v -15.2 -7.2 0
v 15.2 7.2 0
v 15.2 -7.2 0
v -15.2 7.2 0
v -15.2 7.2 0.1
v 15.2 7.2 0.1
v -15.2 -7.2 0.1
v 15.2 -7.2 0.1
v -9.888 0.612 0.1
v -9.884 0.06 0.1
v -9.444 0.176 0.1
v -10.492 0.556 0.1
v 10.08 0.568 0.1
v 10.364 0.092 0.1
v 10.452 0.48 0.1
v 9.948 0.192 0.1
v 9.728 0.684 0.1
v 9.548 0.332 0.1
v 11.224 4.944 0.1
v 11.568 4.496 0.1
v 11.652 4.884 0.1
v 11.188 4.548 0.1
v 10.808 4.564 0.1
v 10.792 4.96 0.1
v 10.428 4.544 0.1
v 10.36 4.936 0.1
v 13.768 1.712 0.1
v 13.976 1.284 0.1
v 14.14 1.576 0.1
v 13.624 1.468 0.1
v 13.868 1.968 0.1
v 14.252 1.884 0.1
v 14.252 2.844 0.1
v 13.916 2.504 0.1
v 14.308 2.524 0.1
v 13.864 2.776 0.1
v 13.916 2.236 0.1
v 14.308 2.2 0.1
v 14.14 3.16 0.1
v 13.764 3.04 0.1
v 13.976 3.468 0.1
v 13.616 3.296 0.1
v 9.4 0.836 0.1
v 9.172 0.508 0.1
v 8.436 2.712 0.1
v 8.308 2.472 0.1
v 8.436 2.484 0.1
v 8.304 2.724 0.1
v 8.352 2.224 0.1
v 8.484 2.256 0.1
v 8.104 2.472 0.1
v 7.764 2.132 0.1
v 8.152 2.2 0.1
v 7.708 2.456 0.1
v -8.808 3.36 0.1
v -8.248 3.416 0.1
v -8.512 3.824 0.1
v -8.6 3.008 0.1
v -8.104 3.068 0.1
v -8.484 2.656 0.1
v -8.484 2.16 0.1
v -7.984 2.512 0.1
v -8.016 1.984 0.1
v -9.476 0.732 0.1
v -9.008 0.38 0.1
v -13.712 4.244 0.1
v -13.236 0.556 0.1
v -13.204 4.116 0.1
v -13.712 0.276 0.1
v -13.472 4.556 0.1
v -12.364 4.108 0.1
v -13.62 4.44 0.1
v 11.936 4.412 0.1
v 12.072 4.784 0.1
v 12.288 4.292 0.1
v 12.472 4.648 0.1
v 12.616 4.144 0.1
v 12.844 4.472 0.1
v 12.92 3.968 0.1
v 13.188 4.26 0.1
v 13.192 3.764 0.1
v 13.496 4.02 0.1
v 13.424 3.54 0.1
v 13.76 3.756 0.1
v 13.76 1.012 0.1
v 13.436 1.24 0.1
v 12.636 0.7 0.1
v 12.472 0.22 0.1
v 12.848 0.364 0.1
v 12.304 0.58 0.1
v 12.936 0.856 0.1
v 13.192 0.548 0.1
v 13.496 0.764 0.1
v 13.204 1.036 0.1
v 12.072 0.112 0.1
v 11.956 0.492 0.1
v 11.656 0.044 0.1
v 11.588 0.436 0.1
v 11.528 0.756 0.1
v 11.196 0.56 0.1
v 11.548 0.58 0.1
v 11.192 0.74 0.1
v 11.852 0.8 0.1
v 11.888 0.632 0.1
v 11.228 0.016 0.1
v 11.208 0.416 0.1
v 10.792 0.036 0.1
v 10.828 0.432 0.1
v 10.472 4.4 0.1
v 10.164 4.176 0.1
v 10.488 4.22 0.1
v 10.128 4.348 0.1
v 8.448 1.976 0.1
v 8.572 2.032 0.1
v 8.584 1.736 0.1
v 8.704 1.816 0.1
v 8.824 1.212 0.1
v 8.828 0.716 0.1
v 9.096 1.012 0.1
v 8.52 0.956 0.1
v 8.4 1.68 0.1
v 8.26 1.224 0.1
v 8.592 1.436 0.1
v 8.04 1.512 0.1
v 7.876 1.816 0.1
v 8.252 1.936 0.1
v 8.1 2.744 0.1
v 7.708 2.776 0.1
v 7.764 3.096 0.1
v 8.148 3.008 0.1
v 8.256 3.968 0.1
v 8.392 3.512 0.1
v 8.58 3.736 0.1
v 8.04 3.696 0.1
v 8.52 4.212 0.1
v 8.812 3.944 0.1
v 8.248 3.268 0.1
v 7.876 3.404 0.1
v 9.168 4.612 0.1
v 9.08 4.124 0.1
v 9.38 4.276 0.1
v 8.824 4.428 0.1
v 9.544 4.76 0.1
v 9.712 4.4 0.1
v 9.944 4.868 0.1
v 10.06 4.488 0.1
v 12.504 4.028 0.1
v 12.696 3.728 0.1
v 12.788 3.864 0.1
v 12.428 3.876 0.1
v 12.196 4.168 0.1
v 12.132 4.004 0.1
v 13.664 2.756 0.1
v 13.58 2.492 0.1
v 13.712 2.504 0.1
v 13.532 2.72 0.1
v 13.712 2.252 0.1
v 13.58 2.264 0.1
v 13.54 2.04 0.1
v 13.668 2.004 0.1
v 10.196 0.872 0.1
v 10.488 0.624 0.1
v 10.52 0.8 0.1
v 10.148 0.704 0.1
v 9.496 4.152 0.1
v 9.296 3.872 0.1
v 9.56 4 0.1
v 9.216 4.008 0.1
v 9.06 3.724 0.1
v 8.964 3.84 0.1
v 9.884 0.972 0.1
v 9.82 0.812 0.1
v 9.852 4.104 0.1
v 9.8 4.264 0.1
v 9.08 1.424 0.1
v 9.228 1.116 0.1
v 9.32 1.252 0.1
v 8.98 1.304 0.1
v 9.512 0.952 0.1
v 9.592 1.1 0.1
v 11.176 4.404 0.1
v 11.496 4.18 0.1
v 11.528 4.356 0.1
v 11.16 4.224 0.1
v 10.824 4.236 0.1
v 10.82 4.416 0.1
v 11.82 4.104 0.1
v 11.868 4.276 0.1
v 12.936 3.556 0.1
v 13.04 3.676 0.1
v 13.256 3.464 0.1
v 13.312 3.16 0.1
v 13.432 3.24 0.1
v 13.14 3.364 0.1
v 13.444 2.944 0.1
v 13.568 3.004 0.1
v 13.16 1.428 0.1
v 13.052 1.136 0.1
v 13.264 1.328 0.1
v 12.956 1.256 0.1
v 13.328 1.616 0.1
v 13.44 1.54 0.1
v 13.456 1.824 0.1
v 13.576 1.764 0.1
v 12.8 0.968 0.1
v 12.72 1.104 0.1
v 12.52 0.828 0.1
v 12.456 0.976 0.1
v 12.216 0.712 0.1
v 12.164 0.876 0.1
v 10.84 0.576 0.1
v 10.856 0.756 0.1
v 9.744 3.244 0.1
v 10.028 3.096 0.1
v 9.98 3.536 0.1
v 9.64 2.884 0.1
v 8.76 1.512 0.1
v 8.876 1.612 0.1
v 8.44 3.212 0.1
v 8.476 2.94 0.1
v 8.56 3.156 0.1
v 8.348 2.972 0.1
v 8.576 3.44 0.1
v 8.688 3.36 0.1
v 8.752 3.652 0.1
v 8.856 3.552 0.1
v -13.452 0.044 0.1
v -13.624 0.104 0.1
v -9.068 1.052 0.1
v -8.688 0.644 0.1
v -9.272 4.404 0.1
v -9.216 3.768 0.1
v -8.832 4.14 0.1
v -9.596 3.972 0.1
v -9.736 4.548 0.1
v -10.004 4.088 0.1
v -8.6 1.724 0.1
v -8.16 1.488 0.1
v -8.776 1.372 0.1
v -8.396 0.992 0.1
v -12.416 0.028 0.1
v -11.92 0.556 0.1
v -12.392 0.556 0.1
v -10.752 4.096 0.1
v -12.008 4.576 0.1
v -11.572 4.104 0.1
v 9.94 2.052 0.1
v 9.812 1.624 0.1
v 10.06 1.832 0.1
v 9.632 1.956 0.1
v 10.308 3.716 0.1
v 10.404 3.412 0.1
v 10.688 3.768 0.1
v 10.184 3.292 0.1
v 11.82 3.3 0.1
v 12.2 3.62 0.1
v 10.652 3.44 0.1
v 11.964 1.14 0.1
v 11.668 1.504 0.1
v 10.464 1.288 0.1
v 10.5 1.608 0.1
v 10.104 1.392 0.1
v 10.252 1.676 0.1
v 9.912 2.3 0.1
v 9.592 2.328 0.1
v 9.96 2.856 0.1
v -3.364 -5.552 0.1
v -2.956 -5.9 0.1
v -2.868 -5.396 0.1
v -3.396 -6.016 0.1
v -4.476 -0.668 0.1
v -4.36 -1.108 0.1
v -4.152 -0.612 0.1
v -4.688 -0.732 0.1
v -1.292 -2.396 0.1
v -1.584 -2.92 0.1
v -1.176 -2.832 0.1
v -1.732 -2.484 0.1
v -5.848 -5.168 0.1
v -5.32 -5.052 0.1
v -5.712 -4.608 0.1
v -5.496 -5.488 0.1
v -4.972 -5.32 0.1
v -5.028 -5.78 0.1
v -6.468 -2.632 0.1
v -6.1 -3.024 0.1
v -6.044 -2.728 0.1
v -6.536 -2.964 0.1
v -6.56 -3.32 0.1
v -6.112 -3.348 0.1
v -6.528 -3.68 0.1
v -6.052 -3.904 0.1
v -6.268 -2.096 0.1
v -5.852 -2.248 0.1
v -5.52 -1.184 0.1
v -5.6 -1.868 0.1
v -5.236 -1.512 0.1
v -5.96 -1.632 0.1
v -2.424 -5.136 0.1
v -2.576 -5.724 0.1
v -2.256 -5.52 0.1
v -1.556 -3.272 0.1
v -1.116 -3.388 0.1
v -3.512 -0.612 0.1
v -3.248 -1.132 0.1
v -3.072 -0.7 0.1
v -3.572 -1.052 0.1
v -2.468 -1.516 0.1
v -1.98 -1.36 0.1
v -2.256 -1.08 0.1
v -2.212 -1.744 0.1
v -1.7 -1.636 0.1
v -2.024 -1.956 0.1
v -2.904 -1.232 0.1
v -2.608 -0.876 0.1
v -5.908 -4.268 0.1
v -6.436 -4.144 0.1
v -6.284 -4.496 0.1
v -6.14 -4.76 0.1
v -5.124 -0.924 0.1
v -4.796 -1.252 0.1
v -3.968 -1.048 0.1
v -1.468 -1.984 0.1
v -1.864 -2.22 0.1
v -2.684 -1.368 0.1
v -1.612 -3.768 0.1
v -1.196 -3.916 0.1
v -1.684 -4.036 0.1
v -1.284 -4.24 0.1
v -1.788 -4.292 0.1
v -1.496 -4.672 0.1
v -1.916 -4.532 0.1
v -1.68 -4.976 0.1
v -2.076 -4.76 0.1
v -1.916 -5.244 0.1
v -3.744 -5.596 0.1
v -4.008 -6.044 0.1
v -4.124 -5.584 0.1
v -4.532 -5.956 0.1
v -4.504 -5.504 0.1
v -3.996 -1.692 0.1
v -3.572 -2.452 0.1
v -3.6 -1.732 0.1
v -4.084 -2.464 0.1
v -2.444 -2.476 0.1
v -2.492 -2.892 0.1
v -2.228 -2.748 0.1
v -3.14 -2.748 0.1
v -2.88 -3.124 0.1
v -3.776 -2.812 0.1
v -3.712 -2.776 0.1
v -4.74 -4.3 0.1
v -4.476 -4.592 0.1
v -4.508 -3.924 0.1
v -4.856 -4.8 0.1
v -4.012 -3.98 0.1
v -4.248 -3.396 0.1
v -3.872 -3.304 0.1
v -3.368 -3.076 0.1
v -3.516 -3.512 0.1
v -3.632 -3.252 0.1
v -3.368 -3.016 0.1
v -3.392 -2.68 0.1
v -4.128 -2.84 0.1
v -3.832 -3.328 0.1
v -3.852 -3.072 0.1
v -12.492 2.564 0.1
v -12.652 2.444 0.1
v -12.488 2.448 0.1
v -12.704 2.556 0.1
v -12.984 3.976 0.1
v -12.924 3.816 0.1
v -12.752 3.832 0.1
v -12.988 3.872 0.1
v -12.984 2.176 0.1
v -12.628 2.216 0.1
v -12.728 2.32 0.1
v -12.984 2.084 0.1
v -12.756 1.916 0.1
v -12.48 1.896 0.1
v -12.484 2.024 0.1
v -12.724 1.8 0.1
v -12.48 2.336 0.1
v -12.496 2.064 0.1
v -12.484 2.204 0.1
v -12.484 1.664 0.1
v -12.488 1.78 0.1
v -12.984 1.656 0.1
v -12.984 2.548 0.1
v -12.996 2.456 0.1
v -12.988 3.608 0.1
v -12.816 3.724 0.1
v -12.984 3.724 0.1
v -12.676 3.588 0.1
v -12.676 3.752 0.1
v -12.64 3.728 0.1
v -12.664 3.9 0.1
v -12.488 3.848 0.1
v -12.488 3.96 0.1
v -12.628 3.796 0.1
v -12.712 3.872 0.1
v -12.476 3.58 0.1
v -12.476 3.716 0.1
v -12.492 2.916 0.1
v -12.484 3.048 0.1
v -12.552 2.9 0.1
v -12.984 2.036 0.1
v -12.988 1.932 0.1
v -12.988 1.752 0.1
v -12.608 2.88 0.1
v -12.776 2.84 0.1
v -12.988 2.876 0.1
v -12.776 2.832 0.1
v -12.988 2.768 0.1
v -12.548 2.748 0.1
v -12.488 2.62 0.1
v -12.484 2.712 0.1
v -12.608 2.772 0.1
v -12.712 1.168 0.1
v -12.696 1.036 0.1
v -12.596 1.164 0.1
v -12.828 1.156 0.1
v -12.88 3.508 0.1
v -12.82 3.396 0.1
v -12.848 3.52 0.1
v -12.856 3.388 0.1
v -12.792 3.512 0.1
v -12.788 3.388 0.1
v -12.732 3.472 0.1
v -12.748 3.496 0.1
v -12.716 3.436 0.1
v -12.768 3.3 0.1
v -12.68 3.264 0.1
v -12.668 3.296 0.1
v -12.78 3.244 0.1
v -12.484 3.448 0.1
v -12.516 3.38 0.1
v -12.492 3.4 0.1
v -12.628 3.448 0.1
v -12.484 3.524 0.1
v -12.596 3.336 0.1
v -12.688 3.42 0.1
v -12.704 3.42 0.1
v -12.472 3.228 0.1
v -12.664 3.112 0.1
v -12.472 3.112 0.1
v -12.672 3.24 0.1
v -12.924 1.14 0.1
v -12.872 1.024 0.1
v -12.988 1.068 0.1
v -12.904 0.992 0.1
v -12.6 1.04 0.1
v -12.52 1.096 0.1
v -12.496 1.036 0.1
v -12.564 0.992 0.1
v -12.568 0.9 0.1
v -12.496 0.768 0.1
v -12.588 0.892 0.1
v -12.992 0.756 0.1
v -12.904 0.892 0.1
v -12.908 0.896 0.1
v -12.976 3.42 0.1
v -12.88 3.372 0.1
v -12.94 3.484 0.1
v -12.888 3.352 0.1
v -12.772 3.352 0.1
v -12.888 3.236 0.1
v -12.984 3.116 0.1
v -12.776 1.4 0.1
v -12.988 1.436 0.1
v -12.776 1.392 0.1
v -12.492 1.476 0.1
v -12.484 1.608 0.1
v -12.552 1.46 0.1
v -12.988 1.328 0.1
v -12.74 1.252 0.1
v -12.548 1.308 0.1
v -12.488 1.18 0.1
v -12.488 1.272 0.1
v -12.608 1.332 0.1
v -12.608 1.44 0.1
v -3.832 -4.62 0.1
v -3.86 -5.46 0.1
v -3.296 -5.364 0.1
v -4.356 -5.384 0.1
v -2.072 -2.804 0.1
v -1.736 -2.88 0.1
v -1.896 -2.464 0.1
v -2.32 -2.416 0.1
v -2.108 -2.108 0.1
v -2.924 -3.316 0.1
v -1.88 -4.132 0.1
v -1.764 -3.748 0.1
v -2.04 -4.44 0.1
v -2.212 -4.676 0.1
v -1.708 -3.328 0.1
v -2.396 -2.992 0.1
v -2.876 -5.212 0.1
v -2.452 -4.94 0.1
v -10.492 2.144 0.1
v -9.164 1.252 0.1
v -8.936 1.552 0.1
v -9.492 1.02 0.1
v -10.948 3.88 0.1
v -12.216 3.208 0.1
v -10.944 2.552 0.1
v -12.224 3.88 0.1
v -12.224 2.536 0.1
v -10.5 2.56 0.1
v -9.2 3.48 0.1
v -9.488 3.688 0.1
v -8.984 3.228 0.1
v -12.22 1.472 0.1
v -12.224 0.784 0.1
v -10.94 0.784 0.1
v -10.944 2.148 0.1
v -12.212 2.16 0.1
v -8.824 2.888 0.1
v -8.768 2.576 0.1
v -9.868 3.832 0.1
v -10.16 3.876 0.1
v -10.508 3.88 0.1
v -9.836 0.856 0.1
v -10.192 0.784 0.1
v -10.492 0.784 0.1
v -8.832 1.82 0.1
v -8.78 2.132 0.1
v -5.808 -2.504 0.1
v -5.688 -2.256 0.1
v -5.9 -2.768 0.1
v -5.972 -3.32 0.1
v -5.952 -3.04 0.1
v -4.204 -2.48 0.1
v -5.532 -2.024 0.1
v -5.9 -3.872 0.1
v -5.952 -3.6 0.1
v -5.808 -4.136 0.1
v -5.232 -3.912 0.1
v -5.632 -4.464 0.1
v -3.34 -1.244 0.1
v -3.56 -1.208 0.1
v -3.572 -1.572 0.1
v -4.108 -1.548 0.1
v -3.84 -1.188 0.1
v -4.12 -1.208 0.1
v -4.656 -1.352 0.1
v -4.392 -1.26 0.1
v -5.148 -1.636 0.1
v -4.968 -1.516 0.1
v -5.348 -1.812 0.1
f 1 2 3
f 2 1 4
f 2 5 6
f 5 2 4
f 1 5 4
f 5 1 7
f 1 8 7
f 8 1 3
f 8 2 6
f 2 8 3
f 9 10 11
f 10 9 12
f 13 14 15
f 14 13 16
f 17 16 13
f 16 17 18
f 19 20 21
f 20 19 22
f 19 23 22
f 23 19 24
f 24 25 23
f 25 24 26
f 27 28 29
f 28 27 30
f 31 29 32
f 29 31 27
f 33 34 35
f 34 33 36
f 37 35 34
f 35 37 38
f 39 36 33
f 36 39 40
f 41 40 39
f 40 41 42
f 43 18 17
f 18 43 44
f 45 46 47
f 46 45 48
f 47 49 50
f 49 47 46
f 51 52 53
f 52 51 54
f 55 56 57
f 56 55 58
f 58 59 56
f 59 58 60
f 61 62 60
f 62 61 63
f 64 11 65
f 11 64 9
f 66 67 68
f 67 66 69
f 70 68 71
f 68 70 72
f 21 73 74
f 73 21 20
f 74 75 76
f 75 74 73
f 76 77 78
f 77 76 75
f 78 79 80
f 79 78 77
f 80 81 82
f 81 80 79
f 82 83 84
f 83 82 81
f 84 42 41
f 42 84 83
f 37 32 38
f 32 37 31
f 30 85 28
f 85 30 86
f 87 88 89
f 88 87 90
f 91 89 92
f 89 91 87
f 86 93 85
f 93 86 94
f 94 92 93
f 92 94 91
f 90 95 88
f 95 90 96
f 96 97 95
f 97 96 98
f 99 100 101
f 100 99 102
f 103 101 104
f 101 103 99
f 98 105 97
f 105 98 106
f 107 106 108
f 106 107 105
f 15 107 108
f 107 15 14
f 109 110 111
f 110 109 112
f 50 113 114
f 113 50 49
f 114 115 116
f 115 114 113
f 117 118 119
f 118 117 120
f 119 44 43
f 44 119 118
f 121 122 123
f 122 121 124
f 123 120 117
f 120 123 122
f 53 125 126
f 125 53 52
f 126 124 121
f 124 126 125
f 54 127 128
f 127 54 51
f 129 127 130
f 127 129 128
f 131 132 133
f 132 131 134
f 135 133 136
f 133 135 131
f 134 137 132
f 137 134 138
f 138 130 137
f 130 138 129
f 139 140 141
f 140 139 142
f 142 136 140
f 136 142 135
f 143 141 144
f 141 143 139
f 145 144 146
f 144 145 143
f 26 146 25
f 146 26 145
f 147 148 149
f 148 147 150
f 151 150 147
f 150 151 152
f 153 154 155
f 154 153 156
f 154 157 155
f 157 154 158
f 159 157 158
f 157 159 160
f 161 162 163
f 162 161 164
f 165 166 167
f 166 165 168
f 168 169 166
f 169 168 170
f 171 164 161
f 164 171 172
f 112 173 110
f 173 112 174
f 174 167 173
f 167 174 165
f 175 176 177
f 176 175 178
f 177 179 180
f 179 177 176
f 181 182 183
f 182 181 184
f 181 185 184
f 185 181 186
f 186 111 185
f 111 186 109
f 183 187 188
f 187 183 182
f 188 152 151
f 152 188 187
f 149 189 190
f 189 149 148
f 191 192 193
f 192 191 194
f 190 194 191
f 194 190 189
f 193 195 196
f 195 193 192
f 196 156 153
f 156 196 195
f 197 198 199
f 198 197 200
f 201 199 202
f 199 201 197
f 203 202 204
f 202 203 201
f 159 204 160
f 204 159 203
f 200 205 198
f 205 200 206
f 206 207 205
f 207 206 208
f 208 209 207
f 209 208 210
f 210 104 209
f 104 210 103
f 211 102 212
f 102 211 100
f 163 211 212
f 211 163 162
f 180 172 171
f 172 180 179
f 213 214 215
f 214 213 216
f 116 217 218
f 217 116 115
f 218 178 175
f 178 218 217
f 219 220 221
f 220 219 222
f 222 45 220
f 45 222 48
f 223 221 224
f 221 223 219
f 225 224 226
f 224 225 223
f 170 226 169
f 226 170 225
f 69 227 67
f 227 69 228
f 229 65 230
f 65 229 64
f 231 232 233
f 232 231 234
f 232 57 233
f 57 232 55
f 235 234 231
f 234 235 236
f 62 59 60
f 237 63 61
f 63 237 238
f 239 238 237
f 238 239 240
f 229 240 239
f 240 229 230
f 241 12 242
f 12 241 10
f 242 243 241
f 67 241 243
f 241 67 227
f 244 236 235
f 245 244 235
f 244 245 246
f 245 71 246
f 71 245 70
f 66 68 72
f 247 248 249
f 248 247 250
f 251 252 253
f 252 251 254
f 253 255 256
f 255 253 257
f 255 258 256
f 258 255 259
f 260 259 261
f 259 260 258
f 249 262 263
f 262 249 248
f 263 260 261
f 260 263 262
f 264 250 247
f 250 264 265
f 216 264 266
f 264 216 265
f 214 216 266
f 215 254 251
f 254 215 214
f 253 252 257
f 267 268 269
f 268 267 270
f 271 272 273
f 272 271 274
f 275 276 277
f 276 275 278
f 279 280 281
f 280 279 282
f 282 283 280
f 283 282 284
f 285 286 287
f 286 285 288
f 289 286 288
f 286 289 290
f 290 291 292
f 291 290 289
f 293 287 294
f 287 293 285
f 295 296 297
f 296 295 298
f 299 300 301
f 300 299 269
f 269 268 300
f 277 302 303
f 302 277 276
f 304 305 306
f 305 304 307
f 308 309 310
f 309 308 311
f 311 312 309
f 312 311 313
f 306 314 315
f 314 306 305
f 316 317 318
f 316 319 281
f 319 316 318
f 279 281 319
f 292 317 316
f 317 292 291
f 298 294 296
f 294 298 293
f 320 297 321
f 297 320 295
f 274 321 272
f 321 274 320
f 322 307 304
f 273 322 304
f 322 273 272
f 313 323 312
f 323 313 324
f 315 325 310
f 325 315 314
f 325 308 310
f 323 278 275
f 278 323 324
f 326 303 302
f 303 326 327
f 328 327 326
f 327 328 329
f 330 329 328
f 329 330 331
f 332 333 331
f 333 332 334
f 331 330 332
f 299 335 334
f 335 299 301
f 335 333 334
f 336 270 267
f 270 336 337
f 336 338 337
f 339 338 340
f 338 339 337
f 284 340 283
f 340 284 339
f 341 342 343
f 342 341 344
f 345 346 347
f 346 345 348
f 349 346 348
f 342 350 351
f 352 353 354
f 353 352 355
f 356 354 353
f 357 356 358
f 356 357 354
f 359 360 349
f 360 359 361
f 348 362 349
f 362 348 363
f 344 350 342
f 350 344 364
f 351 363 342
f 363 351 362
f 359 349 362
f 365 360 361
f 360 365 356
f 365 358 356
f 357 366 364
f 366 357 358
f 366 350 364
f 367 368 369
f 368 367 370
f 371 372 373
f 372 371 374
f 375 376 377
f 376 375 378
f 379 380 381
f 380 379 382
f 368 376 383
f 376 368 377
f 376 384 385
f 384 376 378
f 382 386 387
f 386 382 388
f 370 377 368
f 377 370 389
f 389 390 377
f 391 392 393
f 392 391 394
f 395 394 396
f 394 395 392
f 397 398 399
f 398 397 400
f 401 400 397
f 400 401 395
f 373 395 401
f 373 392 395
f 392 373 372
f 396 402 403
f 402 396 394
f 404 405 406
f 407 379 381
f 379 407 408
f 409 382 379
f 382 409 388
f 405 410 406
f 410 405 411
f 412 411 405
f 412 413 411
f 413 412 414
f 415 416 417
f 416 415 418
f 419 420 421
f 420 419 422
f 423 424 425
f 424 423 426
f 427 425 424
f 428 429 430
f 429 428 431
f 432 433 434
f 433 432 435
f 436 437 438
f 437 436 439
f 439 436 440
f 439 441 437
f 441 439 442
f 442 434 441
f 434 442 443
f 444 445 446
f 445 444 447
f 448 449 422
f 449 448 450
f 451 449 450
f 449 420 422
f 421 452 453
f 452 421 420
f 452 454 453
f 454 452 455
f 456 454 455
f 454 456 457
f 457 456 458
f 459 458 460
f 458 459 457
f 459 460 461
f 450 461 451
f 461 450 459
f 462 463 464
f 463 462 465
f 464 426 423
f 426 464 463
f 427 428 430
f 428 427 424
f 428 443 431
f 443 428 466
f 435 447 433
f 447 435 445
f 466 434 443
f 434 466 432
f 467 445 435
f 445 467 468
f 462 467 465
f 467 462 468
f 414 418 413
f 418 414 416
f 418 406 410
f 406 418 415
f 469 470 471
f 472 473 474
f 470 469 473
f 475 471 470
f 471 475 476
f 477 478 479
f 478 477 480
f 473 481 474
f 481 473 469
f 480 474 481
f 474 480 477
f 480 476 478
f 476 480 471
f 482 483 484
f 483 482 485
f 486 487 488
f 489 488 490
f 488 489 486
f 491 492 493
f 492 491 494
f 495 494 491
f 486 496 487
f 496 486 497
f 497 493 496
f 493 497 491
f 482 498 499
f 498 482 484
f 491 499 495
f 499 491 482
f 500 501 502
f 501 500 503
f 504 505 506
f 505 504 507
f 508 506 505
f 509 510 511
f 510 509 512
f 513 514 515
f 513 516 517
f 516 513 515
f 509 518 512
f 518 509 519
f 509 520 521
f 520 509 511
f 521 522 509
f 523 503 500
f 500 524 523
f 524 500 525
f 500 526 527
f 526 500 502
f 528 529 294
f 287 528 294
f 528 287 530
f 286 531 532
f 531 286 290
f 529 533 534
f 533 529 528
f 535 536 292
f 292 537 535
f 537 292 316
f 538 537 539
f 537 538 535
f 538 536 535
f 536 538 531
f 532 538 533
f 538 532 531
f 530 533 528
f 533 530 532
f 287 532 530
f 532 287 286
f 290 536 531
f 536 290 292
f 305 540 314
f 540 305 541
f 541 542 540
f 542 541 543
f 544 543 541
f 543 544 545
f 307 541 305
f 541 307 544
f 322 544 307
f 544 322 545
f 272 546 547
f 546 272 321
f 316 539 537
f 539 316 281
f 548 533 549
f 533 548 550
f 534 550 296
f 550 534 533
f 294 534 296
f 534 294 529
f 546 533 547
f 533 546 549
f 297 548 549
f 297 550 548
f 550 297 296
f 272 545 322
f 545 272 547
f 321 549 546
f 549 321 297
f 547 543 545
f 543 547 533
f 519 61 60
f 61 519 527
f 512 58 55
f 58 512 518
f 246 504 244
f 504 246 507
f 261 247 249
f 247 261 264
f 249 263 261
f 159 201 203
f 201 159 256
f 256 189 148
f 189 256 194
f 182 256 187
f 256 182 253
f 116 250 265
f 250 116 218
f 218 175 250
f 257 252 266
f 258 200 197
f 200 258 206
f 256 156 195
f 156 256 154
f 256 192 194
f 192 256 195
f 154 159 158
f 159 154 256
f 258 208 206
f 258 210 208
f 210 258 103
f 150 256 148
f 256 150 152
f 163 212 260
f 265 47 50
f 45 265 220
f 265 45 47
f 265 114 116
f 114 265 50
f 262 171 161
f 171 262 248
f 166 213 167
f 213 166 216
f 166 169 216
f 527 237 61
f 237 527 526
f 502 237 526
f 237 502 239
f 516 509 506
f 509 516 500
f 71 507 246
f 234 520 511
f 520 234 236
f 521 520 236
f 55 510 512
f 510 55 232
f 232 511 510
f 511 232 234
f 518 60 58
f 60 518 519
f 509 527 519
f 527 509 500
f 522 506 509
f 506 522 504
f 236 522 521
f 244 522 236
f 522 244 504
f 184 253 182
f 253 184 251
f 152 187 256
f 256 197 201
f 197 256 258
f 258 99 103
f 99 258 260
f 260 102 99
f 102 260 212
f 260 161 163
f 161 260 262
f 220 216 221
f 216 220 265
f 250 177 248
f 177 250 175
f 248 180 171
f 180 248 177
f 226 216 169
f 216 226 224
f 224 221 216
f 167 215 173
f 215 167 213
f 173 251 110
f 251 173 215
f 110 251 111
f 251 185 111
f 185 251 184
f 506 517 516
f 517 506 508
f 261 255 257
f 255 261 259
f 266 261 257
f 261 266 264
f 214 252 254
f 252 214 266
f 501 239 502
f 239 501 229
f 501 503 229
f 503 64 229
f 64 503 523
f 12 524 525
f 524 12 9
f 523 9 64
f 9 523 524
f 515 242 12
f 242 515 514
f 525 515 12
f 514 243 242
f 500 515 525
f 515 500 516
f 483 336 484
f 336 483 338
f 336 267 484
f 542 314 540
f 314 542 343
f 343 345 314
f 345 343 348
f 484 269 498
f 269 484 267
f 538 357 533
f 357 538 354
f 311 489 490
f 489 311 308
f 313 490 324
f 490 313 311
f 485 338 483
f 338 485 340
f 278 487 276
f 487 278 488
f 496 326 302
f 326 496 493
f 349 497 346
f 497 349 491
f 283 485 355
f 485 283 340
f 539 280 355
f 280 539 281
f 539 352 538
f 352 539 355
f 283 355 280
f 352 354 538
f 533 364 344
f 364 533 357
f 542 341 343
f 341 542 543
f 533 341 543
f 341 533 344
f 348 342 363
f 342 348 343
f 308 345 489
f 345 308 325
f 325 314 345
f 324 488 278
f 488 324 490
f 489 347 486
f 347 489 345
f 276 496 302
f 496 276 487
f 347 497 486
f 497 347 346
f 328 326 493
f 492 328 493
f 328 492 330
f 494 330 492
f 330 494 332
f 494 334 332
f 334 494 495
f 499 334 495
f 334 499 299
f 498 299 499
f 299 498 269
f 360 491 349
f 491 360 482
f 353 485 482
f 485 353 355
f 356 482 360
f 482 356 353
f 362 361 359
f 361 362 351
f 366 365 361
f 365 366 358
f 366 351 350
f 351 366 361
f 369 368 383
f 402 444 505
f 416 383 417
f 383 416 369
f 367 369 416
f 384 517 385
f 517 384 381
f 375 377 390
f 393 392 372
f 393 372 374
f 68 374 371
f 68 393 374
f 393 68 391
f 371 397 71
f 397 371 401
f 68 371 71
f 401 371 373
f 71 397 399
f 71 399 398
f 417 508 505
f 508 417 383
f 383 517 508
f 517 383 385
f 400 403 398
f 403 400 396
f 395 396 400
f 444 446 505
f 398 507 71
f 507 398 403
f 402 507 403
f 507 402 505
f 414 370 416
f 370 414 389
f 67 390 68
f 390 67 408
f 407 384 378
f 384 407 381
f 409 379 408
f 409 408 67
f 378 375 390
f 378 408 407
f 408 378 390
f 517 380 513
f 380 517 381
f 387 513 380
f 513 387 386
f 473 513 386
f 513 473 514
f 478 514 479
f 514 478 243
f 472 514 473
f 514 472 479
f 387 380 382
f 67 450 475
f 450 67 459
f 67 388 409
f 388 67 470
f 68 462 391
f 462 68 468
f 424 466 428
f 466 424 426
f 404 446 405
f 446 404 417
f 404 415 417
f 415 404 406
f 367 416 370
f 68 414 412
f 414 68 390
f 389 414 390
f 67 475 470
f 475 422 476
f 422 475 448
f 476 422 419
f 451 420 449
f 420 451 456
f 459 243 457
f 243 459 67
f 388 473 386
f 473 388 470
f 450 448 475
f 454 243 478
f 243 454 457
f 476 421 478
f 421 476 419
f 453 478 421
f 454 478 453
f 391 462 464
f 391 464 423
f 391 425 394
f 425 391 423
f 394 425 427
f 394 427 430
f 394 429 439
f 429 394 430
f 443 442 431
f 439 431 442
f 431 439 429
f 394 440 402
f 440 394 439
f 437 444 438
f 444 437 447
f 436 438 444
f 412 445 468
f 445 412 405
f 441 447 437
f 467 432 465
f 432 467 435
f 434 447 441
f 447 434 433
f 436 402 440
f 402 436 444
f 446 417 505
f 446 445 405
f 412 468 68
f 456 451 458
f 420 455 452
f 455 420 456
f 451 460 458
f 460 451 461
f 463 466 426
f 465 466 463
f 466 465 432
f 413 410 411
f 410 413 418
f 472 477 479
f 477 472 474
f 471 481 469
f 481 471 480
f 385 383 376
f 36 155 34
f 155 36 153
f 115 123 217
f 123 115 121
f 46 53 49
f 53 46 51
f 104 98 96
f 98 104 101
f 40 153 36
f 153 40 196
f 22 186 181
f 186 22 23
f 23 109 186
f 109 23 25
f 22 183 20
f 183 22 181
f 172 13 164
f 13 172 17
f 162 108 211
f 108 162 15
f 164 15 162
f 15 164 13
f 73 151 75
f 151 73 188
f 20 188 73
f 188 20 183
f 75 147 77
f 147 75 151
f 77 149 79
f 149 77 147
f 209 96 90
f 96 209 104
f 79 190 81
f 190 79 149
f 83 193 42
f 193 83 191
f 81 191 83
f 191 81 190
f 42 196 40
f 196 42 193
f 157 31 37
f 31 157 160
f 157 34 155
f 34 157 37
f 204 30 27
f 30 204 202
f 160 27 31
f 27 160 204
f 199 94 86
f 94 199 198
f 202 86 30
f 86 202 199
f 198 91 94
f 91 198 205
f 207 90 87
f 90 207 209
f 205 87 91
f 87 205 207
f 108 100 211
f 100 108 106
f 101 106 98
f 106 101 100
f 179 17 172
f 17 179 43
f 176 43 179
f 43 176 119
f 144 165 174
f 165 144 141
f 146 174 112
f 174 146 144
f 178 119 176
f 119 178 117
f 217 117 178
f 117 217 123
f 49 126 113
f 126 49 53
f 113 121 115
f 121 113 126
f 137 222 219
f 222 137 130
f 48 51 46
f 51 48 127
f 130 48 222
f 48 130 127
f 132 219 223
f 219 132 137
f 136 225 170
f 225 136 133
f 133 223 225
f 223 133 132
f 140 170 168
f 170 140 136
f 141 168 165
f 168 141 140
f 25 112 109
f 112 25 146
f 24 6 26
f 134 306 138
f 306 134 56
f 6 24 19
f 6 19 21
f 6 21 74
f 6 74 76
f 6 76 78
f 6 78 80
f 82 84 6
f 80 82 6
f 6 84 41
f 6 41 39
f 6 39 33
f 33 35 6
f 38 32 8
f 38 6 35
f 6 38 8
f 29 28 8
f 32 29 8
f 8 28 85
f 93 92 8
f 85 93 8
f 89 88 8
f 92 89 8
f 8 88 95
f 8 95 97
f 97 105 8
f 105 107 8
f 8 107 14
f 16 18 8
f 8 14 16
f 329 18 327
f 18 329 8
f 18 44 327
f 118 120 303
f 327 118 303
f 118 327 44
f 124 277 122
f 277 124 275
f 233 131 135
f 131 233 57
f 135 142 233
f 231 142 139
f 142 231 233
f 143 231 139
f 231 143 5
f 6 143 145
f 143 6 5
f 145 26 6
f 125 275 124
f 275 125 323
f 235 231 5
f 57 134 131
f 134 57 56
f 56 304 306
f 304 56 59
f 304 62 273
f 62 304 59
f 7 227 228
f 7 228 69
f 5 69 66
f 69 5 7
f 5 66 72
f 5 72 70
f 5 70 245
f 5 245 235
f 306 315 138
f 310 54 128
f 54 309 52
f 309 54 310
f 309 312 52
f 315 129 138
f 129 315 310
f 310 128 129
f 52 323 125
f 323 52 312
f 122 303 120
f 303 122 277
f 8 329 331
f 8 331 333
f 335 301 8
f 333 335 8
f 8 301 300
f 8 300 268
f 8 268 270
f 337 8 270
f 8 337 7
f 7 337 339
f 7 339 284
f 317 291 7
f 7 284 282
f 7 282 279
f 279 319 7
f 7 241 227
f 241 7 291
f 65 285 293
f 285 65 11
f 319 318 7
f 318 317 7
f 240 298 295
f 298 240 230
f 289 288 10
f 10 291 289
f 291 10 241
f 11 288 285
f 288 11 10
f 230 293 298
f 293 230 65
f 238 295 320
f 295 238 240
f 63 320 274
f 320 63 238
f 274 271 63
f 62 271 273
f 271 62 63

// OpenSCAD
use <../lib.scad>
use <6296256c.scad>
function ldraw_lib__6372023c() = [
// 0 =Sticker  1.8 x  3.8 with France, Germany and Denmark Stickers on Medium Nougat
// 0 Name: 6372023c.dat
// 0 Author: Magnus Forsberg [MagFors]
// 0 !LDRAW_ORG Part Alias UPDATE 2024-06
// 0 !LICENSE Licensed under CC BY 4.0 : see CAreadme.txt
// 
// 0 BFC CERTIFY CCW
  [0,"BFC","CERTIFY"],
  [0,"BFC","CCW"],
// 
// 0 !KEYWORDS 500, Bricklink 77942stk01, Brickowl 1064764, Cinquecento, FIAT
// 0 !KEYWORDS Nuova, Rebrickable 83460, set 77942
// 
// 0 !HISTORY 2024-07-29 [OrionP] Official Update 2024-06
// 
// 
// 1 16 0 0 0 1 0 0 0 1 0 0 0 1 6296256c.dat
  [1,16,0,0,0,1,0,0,0,1,0,0,0,1, ldraw_lib__6296256c()],
];
module ldraw_lib__6372023c(step=0, col=false, unit=2/5, alt=false, line=0.2, solid=!$preview)
    makepoly(ldraw_lib__6372023c(), step=step, col=col, unit=unit, alt=alt, line=line, solid=solid);
ldraw_lib__6372023c(line=0.2);
